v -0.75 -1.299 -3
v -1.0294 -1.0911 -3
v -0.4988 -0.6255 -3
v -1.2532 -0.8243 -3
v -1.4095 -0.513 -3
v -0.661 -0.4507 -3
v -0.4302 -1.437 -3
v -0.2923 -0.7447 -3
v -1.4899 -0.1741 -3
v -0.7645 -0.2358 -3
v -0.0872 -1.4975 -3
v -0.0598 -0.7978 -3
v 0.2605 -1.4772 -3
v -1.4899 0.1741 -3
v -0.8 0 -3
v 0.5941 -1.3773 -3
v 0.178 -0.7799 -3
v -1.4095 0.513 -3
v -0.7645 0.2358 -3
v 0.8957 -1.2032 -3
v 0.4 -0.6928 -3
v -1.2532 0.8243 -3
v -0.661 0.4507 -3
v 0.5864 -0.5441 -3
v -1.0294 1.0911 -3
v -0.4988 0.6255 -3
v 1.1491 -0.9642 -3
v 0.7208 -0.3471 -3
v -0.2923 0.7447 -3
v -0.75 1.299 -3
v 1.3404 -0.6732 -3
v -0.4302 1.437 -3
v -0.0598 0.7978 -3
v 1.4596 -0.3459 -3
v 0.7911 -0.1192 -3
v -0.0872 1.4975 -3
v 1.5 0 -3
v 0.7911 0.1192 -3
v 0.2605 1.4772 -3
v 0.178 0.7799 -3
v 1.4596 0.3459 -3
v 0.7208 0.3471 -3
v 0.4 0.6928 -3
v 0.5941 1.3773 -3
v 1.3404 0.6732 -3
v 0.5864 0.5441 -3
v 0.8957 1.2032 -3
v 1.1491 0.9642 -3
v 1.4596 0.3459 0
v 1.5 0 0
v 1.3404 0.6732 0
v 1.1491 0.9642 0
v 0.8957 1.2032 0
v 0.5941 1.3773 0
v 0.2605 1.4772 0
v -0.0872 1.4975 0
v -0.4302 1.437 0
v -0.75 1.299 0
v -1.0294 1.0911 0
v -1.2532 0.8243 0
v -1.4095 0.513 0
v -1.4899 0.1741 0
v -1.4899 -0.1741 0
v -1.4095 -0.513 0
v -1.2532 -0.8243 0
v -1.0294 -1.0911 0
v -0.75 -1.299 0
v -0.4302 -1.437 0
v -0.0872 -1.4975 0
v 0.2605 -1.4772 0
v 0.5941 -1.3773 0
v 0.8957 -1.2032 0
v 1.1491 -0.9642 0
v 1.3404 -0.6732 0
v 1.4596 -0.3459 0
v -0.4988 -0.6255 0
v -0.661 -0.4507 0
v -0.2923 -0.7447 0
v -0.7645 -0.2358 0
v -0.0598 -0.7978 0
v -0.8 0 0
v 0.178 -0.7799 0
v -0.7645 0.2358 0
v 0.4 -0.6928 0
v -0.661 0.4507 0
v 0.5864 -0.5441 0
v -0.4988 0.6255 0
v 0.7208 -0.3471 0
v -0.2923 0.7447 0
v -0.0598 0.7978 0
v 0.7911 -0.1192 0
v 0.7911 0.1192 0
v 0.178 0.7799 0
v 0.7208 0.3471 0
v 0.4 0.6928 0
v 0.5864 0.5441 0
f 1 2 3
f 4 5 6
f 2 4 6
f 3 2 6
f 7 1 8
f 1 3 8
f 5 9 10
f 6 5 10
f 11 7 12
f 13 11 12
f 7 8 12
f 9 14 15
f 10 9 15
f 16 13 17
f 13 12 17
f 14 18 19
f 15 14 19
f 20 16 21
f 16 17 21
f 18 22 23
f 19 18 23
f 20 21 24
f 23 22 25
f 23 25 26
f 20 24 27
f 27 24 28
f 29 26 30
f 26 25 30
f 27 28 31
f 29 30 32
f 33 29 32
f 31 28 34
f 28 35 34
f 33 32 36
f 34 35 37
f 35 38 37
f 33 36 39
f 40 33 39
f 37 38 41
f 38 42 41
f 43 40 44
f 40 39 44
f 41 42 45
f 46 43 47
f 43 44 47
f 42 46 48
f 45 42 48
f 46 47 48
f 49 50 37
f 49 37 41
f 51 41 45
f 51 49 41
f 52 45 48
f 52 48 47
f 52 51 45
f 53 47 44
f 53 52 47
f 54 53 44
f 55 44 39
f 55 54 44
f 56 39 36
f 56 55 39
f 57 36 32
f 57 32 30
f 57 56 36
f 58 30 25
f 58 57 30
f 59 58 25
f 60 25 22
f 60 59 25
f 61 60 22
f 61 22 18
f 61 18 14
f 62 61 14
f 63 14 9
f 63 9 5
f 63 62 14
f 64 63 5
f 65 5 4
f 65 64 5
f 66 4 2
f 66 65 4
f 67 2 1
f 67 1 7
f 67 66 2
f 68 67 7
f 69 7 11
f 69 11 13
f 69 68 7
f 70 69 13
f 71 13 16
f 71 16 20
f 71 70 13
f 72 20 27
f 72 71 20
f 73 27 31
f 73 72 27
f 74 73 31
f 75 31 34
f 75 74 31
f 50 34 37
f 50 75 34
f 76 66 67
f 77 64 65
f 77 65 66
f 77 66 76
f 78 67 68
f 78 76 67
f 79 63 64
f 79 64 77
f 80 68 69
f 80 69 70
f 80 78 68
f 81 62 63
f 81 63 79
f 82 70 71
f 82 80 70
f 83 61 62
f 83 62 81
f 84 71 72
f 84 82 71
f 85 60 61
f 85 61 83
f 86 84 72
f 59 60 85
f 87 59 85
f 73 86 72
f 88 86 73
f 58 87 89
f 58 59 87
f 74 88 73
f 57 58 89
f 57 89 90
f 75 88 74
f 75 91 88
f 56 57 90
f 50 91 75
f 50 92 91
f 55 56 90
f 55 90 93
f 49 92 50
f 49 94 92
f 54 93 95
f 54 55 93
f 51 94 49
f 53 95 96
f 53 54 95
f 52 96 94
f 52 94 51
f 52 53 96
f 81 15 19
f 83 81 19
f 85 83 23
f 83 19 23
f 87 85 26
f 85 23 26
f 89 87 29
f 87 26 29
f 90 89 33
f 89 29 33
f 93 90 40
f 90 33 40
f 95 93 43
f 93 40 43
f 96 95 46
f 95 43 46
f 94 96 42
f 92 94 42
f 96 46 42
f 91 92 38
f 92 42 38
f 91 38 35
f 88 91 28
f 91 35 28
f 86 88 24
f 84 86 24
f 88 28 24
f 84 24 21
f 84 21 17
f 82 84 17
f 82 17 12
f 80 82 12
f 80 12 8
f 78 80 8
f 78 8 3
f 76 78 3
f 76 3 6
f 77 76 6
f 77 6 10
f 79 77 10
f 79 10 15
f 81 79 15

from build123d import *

# Parameters (mm, degrees)
SKETCH_7_W        = 3
SKETCH_7_H        = 1.4
HOLE_WIZARD_M21_D = 1.6
SKETCH_47_R       = 1.5
SKETCH_47_R_2     = 1.4
EXTRUDE_1_DEPTH   = 3


with BuildPart() as part:
    # Эскиз7 → Повернуть1 (revolve)
    with BuildSketch(Plane(origin=(0, 0, 0), x_dir=(0, 0, -1), z_dir=(1, 0, 0))):
        with Locations((1.5, 0.7)):
            Rectangle(SKETCH_7_W, SKETCH_7_H)
    revolve(axis=Axis((0, 0, 0), (0, 0, -1)))

    # Отверстие обработанное метчиком M21 (through all)
    with Locations(Plane.XY):
        with Locations((0, 0)):
            Hole(HOLE_WIZARD_M21_D / 2)

    # Эскиз47 → Бобышка-Вытянуть1 (add)
    with BuildSketch(Plane.XY):
        Circle(SKETCH_47_R)
        Circle(SKETCH_47_R_2, mode=Mode.SUBTRACT)
    extrude(amount=-EXTRUDE_1_DEPTH)


solid = part.part
